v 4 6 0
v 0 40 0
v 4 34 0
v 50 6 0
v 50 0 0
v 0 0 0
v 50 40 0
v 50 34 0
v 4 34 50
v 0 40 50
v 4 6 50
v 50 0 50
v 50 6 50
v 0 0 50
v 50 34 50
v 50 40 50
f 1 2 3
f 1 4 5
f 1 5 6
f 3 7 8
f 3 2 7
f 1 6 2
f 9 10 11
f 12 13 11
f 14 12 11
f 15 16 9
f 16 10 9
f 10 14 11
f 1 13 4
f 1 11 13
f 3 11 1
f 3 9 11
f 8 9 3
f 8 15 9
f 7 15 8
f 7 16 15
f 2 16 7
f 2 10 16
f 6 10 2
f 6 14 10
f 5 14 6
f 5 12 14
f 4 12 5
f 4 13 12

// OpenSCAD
$fn = 32;

// ----------------------------------------------------------------------
// Structural section: channel 50 x 40 mm
// ----------------------------------------------------------------------

// --- parameters (mm) ---
sec_w = 50;               // channel width, X
sec_h = 40;               // channel height, Y
flange_t = 6;             // flange thickness
web_t = 4;                // web thickness
plate_t = 50;             // cut length, Z (extrusion height)

profile = [[0, 0], [50, 0], [50, 6], [4, 6], [4, 34], [50, 34], [50, 40], [0, 40]];  // primary outline, 8 points, counter clockwise

// --- the one profile operation ---
linear_extrude(height = plate_t) polygon(points = profile);
